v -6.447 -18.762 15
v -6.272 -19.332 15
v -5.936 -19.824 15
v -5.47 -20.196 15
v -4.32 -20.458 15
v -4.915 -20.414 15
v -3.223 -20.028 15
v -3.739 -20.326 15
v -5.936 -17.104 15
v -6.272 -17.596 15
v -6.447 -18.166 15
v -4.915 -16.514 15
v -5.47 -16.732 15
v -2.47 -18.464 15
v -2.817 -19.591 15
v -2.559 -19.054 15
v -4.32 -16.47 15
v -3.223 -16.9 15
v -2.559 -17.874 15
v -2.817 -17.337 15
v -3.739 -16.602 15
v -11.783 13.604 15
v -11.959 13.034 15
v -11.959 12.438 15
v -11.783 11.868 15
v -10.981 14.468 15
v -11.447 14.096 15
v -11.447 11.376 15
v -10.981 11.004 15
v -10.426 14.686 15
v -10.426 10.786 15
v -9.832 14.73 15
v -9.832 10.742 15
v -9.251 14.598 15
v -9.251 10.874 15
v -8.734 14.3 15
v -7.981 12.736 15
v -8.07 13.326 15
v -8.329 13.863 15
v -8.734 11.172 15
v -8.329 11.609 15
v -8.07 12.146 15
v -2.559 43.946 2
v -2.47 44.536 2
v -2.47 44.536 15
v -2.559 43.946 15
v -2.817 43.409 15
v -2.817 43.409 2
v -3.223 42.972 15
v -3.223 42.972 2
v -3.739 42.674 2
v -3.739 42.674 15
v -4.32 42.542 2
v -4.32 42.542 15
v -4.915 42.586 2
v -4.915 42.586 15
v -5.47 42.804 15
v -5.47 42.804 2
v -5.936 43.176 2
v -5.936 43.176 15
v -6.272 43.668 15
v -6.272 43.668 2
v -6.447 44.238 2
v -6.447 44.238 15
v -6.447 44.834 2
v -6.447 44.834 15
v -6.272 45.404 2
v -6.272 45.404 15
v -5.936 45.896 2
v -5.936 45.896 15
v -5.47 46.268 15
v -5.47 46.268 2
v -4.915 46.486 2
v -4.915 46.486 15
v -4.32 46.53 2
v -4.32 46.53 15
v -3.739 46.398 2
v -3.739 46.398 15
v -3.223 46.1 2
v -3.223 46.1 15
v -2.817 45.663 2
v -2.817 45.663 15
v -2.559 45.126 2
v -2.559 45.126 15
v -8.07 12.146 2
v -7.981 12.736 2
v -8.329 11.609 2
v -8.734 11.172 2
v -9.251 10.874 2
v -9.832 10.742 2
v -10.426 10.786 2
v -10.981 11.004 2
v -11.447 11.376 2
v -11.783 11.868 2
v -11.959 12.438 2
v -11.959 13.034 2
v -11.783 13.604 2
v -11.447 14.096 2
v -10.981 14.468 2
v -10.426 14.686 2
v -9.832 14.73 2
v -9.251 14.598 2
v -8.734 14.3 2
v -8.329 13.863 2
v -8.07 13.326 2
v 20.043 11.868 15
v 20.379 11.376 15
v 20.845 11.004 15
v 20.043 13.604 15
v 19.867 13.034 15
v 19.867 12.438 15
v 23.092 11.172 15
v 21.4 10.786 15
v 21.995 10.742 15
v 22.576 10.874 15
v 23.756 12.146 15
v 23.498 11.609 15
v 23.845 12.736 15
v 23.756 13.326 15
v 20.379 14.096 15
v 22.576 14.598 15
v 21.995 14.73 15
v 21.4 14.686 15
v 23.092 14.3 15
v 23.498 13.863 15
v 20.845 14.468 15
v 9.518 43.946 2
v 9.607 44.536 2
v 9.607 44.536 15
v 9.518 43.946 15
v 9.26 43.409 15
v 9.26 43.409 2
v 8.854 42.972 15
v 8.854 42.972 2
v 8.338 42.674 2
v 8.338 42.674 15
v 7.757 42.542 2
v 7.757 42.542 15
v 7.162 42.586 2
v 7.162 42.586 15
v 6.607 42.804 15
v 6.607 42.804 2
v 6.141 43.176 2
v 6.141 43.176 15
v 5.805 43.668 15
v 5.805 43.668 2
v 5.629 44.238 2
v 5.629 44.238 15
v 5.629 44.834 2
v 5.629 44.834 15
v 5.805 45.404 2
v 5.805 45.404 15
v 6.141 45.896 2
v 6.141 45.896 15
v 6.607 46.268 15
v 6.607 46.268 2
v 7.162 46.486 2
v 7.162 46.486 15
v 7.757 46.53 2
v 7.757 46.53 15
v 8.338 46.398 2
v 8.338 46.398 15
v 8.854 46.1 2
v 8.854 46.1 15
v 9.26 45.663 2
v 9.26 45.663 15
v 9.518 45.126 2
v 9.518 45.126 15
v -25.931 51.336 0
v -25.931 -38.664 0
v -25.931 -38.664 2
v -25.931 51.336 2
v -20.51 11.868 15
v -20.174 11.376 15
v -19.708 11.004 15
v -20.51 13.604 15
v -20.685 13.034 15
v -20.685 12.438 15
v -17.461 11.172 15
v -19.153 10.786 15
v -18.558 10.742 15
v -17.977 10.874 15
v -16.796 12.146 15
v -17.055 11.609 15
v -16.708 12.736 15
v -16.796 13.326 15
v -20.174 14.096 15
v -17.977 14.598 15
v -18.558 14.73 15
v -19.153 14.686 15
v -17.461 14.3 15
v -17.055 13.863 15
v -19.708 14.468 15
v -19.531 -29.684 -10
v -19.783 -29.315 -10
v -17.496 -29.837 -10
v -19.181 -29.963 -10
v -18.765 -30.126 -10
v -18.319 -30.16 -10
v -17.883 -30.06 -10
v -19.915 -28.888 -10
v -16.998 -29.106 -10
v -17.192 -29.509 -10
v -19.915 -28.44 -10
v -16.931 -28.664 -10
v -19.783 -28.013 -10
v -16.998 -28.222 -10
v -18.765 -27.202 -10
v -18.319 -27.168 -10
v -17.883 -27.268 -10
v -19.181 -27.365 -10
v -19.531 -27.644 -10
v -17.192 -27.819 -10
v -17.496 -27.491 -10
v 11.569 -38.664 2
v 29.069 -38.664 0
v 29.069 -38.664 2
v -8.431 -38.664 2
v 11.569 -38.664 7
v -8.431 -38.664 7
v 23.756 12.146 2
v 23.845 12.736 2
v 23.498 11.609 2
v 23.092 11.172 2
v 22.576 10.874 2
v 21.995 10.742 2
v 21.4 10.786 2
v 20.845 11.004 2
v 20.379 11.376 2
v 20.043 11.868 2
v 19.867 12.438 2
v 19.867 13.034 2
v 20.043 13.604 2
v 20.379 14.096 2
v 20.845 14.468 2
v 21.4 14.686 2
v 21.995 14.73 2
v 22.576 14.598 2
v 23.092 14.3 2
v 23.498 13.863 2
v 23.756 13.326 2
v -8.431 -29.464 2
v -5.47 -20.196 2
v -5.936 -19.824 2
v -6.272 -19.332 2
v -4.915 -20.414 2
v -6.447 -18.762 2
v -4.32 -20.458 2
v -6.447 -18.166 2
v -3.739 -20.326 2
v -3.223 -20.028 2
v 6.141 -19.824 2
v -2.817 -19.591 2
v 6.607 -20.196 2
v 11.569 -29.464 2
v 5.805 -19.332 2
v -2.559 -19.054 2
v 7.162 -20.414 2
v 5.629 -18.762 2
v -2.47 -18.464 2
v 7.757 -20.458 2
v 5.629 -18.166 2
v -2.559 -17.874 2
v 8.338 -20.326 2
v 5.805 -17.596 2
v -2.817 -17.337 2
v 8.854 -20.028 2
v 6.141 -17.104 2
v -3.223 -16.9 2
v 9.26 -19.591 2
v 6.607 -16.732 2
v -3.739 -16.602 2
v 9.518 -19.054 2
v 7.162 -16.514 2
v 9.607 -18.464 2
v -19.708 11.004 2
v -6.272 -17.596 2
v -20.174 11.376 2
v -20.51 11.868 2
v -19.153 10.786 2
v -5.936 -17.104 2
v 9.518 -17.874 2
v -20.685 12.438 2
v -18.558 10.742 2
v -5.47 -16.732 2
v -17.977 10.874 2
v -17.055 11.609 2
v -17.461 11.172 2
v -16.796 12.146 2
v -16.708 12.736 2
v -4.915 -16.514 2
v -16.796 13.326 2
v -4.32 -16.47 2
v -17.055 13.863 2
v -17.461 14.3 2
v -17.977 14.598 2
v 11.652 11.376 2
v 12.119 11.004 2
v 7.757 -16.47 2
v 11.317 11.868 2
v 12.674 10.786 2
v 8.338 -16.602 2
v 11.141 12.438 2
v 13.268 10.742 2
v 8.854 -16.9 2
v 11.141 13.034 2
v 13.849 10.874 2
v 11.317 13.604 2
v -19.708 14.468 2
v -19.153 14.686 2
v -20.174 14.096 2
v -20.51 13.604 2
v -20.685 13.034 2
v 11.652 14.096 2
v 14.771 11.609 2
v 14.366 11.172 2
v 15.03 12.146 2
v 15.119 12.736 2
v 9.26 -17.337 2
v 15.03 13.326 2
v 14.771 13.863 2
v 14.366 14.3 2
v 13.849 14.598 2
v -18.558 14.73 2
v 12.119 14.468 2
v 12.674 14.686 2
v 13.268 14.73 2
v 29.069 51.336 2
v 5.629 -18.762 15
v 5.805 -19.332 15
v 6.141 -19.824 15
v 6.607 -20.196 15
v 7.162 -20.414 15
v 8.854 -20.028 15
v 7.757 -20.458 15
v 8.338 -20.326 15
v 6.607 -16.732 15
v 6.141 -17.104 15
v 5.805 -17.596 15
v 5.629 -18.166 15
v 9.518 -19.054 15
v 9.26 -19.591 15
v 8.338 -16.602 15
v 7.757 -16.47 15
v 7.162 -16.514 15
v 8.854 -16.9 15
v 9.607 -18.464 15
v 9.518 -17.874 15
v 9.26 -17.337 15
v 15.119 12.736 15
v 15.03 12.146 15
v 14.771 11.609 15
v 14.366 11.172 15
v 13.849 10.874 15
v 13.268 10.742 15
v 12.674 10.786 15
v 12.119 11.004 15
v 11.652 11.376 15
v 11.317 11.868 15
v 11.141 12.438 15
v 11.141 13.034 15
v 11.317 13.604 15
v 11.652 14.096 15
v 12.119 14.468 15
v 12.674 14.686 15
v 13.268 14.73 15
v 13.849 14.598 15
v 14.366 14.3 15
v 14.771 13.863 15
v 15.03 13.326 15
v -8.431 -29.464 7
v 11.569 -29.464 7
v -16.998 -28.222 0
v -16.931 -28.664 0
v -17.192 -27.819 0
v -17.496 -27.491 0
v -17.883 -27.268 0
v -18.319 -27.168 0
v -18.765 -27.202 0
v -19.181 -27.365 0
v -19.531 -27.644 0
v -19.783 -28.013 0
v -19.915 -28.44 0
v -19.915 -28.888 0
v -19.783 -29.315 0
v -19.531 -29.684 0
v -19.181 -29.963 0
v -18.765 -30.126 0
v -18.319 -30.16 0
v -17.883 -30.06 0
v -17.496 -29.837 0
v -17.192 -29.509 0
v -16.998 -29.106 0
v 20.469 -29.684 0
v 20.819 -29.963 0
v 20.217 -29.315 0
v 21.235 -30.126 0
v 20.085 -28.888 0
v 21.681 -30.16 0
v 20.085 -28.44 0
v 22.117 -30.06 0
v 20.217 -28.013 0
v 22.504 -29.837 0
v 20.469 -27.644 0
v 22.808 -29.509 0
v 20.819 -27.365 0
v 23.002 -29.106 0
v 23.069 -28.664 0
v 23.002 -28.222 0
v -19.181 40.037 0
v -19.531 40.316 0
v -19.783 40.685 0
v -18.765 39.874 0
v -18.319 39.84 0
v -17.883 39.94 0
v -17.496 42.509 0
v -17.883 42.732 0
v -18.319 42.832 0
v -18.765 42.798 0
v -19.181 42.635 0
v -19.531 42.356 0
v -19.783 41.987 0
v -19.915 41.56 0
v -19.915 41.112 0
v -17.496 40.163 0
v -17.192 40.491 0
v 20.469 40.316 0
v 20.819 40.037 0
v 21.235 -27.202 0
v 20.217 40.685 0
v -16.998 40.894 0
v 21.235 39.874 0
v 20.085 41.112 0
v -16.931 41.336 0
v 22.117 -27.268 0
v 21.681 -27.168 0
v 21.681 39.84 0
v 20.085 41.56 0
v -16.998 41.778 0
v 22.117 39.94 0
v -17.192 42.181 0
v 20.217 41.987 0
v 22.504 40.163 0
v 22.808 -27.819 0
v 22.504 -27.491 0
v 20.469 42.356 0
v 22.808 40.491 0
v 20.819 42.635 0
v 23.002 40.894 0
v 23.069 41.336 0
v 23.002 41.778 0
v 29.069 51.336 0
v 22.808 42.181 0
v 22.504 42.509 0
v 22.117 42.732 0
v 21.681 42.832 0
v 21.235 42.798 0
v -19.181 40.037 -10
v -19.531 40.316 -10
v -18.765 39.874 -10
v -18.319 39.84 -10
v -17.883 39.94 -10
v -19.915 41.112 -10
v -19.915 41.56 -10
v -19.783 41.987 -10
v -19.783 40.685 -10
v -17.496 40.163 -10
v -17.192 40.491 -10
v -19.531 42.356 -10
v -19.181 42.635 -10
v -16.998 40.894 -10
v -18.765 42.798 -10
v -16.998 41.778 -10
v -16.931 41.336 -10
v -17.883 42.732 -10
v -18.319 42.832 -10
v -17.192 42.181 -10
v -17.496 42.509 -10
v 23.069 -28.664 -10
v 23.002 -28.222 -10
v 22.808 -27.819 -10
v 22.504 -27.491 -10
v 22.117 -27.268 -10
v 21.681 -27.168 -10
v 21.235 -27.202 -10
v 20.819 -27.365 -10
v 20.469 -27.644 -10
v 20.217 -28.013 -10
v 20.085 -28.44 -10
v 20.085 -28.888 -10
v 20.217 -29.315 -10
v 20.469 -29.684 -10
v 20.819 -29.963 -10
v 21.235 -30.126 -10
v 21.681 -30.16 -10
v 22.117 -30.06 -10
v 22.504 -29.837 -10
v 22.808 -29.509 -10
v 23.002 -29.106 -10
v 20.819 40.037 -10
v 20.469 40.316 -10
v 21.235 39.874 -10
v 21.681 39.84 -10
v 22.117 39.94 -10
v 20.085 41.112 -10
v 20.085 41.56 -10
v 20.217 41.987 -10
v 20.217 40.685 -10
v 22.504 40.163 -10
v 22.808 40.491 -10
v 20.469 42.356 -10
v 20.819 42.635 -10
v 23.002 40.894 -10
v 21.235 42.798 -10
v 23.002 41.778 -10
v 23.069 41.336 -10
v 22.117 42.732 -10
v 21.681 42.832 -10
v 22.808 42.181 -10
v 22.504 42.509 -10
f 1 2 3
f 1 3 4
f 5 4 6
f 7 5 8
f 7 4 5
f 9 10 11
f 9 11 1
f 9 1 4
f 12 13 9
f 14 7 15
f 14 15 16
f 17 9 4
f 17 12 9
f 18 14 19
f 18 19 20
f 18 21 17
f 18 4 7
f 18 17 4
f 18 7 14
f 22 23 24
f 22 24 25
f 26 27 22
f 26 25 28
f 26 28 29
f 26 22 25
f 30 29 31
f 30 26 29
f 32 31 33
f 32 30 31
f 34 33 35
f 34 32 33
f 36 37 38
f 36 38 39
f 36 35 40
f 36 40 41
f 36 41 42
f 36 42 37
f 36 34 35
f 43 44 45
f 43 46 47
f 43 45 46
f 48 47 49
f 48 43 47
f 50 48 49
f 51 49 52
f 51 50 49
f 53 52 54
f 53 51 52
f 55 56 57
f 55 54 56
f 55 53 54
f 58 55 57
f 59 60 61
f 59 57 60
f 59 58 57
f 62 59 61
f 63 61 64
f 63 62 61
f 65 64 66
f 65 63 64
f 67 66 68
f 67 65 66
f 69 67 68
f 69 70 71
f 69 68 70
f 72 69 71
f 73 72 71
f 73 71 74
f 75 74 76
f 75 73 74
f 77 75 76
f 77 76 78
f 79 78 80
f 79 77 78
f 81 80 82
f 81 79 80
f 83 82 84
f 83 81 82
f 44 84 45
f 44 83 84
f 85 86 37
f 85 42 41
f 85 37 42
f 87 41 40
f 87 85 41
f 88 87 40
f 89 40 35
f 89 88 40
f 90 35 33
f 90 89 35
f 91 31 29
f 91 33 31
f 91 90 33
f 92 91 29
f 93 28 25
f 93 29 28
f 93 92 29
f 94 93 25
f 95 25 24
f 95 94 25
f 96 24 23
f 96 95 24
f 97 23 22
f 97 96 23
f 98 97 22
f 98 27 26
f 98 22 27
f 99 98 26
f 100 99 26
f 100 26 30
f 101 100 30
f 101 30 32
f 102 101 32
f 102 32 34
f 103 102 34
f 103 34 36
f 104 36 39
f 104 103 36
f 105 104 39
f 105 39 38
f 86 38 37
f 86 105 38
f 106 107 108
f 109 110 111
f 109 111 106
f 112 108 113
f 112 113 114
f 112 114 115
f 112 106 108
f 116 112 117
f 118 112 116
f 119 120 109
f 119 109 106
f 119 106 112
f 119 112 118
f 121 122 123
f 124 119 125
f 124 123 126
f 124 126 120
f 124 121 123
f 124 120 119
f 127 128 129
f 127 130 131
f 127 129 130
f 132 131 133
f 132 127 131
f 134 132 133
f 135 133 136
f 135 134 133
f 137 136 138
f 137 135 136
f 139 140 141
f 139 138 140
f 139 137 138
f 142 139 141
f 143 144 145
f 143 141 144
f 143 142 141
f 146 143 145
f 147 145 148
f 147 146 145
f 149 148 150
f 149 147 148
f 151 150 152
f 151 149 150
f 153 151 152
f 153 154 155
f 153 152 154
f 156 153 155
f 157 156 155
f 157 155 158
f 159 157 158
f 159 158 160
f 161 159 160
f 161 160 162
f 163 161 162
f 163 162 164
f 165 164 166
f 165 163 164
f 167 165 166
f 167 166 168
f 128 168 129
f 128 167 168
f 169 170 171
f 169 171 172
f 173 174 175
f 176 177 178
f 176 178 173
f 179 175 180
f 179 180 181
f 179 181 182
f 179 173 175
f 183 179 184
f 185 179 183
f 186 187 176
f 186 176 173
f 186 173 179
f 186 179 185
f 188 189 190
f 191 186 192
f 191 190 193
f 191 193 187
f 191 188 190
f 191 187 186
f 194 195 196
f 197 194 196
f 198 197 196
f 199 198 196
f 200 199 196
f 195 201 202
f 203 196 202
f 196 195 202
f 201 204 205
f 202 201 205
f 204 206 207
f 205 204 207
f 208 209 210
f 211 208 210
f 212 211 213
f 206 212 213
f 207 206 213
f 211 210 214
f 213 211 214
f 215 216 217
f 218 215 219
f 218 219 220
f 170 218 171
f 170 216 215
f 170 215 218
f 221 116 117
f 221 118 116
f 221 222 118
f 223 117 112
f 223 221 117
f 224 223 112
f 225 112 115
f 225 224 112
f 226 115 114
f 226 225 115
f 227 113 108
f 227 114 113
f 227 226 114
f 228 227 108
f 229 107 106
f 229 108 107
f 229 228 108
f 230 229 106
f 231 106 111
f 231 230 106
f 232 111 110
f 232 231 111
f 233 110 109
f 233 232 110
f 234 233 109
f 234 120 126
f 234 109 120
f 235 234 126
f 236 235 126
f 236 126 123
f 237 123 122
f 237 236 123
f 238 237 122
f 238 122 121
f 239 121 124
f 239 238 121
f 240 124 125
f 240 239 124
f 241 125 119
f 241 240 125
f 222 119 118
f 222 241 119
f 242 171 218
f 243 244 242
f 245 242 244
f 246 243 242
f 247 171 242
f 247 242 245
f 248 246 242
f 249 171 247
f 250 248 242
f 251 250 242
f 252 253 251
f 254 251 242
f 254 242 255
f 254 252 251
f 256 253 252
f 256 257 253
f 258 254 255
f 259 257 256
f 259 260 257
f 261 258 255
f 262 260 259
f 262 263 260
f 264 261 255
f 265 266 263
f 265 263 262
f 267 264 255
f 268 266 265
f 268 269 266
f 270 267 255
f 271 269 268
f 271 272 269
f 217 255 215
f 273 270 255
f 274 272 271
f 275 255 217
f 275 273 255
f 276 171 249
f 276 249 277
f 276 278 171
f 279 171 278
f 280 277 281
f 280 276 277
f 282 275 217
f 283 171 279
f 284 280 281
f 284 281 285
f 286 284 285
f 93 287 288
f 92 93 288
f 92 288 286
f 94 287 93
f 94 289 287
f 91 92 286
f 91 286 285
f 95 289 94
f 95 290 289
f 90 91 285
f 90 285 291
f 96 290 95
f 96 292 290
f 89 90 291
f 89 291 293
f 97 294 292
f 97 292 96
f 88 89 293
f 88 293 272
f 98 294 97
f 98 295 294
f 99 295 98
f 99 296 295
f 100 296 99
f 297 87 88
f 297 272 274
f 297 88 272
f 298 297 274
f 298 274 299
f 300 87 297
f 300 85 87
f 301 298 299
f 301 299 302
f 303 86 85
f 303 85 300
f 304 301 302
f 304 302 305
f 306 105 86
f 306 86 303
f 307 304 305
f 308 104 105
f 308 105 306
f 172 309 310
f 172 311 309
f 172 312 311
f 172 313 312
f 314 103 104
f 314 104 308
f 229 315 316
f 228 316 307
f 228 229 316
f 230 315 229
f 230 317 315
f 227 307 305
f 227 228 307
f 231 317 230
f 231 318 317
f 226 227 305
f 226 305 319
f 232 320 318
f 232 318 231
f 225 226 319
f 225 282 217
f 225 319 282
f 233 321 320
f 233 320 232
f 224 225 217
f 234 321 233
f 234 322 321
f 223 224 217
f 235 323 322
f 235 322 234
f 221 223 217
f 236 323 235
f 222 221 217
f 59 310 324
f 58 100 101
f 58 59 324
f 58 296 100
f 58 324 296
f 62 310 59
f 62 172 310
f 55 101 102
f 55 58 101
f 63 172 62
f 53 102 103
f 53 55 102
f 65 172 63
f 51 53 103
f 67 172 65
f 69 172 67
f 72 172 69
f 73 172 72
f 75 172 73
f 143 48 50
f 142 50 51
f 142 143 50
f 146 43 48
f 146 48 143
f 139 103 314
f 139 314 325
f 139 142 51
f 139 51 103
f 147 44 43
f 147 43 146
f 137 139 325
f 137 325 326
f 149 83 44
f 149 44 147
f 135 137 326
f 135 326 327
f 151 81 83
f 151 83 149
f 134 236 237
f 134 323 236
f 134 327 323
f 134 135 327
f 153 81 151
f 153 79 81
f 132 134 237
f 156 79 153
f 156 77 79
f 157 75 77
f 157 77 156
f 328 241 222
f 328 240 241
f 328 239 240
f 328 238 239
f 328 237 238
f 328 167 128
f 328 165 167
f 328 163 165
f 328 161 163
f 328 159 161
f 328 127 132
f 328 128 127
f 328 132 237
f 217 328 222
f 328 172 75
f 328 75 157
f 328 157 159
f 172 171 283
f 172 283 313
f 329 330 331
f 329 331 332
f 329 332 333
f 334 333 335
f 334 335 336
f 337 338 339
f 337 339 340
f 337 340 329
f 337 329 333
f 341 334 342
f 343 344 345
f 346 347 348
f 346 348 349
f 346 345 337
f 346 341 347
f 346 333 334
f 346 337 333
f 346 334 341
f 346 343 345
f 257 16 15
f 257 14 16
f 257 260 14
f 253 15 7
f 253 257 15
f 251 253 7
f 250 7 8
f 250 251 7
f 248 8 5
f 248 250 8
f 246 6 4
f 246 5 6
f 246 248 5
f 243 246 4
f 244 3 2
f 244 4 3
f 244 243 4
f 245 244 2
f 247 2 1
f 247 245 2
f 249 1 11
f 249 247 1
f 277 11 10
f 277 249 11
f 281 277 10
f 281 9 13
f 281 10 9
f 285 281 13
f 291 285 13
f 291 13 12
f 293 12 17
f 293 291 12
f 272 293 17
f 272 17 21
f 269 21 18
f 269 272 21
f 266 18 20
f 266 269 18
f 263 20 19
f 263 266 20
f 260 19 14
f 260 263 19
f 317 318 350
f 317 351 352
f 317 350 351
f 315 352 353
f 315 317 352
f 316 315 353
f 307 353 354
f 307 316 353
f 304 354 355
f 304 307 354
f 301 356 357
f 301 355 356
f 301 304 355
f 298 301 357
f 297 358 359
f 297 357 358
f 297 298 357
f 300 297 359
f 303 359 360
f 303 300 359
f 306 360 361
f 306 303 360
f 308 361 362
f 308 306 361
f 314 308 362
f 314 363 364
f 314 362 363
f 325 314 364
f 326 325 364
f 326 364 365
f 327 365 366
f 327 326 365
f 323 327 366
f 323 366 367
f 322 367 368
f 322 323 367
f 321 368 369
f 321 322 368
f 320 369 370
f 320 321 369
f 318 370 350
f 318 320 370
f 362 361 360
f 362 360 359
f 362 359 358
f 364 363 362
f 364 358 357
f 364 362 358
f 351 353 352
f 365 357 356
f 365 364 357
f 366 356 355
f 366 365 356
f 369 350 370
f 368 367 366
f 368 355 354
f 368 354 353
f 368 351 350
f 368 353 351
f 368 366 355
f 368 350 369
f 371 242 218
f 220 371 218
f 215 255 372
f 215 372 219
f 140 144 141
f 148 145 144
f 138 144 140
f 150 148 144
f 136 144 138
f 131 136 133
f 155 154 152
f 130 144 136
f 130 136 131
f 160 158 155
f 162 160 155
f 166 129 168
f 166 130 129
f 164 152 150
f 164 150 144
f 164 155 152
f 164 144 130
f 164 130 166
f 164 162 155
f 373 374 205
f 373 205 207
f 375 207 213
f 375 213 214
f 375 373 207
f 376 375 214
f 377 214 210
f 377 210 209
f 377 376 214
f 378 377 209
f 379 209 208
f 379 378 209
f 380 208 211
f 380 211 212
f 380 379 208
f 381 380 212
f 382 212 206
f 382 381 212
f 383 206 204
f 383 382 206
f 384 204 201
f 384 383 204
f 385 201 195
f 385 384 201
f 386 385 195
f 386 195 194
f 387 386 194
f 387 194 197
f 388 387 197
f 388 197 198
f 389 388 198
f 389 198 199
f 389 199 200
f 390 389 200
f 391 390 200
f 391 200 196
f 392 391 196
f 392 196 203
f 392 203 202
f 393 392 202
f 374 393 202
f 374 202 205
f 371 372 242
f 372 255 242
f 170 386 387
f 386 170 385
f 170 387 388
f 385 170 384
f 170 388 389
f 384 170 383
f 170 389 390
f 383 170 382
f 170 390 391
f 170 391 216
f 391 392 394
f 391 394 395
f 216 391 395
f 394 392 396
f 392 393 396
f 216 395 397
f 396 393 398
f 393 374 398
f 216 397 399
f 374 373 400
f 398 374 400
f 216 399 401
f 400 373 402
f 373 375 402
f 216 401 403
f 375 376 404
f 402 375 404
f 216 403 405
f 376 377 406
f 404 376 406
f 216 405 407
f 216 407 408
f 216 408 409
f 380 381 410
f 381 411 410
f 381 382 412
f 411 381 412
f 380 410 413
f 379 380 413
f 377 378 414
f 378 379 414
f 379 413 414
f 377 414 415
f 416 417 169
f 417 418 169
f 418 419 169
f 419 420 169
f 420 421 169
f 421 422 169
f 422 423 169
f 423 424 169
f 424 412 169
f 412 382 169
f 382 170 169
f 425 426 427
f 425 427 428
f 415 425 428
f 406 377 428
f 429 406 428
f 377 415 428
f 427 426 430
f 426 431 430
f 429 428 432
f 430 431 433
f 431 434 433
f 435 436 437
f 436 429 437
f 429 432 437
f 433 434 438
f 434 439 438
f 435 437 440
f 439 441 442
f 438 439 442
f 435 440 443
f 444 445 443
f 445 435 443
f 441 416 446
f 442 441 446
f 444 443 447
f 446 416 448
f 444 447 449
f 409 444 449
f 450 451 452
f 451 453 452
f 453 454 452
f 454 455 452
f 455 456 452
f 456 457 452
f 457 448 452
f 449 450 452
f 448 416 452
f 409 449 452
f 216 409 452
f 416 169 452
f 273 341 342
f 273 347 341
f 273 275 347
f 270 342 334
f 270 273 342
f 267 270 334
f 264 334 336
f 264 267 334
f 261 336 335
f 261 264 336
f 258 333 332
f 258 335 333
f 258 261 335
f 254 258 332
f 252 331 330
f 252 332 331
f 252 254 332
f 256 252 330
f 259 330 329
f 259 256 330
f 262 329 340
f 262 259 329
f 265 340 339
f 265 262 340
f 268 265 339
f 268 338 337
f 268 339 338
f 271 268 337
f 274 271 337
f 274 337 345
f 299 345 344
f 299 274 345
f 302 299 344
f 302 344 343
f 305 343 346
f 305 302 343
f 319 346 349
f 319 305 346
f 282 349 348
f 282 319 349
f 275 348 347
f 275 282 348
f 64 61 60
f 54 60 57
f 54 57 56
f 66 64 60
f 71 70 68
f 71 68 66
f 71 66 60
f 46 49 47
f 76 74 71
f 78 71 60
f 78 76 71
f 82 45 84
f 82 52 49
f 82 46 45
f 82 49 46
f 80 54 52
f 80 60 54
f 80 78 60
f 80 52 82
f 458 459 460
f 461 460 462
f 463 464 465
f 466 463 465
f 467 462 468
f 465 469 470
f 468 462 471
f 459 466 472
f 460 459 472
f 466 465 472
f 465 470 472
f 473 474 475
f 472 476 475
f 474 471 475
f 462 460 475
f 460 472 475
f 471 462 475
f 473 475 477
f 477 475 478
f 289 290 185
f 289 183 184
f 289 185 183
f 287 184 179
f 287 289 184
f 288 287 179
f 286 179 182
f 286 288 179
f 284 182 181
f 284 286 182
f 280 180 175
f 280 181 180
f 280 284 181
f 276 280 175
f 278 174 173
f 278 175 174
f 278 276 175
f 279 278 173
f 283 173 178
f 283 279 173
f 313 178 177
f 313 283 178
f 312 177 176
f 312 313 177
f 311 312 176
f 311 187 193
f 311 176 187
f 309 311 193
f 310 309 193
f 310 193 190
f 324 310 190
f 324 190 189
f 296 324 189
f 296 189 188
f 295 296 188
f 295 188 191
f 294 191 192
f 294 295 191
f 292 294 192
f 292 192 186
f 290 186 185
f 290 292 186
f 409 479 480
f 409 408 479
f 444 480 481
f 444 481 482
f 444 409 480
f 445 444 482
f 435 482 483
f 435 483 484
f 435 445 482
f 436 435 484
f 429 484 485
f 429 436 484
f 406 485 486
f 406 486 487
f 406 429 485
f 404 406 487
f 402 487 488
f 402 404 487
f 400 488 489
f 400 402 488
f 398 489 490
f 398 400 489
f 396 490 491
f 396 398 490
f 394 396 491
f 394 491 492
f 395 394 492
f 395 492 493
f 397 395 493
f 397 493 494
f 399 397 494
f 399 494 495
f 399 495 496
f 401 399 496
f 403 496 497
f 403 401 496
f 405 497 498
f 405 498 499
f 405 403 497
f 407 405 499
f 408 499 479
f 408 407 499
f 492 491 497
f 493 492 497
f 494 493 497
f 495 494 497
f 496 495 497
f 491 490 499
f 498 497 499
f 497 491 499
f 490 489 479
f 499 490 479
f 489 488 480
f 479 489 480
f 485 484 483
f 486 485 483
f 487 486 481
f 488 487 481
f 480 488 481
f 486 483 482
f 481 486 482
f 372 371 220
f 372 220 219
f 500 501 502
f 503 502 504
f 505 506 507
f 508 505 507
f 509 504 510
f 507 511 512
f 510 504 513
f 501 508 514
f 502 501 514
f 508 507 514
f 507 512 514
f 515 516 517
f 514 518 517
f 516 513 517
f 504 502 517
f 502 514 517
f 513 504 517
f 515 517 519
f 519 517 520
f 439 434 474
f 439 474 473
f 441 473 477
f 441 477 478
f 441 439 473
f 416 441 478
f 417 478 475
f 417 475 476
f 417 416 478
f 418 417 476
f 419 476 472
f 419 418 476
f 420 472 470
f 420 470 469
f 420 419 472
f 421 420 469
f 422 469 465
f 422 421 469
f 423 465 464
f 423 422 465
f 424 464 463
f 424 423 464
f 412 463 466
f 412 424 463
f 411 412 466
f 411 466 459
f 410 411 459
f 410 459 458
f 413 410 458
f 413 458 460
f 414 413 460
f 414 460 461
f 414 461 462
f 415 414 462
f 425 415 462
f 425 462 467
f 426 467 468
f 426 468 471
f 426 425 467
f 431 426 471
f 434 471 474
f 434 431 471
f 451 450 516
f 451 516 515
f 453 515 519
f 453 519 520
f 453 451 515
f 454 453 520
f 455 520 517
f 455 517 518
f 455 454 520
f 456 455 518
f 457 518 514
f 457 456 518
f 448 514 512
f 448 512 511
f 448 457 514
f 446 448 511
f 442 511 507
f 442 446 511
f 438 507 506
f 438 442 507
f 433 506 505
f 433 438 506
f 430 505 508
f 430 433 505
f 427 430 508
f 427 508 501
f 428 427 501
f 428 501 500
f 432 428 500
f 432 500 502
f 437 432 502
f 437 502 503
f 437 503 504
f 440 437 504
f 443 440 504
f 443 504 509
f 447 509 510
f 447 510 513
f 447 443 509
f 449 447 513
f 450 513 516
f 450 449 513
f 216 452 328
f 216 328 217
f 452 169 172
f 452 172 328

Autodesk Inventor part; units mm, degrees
ref_plane "YZ Plane" through (0, 0, 0) normal (1, 0, 0) x (0, 1, 0)
ref_plane "XZ Plane" through (0, 0, 0) normal (0, 1, 0) x (-1, 0, 0)
ref_plane "XY Plane" through (0, 0, 0) normal (0, 0, 1) x (1, 0, 0)
sketch "Sketch1" plane through (0, 0, 0) normal (0, 0, 1) x (1, 0, 0)
  line L0 (-25.9313, 51.336) -> (29.0687, 51.336)
  line L1 (29.0687, 51.336) -> (29.0687, -38.664)
  line L2 (29.0687, -38.664) -> (-25.9313, -38.664)
  line L3 (-25.9313, -38.664) -> (-25.9313, 51.336)
  circle A0 centre (-4.4697, 44.536) radius 2
  circle A1 centre (-18.7076, 12.736) radius 2
  circle A2 centre (-9.9812, 12.736) radius 2
  circle A3 centre (-4.4697, -18.464) radius 2
  line L4 (1.5687, -29.464) -> (-8.4313, -29.464)
  line L5 (-8.4313, -29.464) -> (-8.4313, -38.664)
  circle A4 centre (7.6071, 44.536) radius 2
  circle A5 centre (21.8451, 12.736) radius 2
  circle A6 centre (13.1186, 12.736) radius 2
  circle A7 centre (7.6071, -18.464) radius 2
  line L6 (1.5687, -29.464) -> (11.5687, -29.464)
  line L7 (11.5687, -29.464) -> (11.5687, -38.664)
  circle A8 centre (21.5687, 41.336) radius 1.5
  circle A9 centre (-18.4313, 41.336) radius 1.5
  circle A10 centre (21.5687, -28.664) radius 1.5
  circle A11 centre (-18.4313, -28.664) radius 1.5
  point P0 (0, 0)
  point P1 (3.1375, 0)
  dimension "d0" = 55
  dimension "d1" = 90
  dimension "d2" = 4
  dimension "d3" = 6.8
  dimension "d4" = 4
  dimension "d5" = 4
  dimension "d6" = 38.6
  dimension "d7" = 38.6
  dimension "d8" = 4
  dimension "d9" = 69.8
  dimension "d10" = 10
  dimension "d11" = 80.8
  dimension "d18" = 3
  dimension "d19" = 7.5
  dimension "d20" = 10
  dimension "d21" = 3
  dimension "d22" = 10
  dimension "d23" = 7.5
  dimension "d24" = 3
  dimension "d25" = 7.5
  dimension "d26" = 10
  dimension "d27" = 3
  dimension "d28" = 7.5
  dimension "d29" = 10
extrude "Extrusion1" add sketch "Sketch1" along normal blind 2 contours L0 L1 L2 L7 L6 L4 L5 L3 | A8 | A9 | A10 | A11
extrude "Extrusion2" add sketch "Sketch1" along normal blind 15 contours A0 | A1 | A2 | A3 | A4 | A5 | A6 | A7
extrude "Extrusion3" add sketch "Sketch1" along normal blind 7 contours L5 L4 L6 L7 L2
extrude "Extrusion4" add sketch "Sketch1" against normal blind 10 contours A8
extrude "Extrusion5" add sketch "Sketch1" against normal blind 10 contours A9
extrude "Extrusion6" add sketch "Sketch1" against normal blind 10 contours A10 | A11
properties part number "line sensor"
